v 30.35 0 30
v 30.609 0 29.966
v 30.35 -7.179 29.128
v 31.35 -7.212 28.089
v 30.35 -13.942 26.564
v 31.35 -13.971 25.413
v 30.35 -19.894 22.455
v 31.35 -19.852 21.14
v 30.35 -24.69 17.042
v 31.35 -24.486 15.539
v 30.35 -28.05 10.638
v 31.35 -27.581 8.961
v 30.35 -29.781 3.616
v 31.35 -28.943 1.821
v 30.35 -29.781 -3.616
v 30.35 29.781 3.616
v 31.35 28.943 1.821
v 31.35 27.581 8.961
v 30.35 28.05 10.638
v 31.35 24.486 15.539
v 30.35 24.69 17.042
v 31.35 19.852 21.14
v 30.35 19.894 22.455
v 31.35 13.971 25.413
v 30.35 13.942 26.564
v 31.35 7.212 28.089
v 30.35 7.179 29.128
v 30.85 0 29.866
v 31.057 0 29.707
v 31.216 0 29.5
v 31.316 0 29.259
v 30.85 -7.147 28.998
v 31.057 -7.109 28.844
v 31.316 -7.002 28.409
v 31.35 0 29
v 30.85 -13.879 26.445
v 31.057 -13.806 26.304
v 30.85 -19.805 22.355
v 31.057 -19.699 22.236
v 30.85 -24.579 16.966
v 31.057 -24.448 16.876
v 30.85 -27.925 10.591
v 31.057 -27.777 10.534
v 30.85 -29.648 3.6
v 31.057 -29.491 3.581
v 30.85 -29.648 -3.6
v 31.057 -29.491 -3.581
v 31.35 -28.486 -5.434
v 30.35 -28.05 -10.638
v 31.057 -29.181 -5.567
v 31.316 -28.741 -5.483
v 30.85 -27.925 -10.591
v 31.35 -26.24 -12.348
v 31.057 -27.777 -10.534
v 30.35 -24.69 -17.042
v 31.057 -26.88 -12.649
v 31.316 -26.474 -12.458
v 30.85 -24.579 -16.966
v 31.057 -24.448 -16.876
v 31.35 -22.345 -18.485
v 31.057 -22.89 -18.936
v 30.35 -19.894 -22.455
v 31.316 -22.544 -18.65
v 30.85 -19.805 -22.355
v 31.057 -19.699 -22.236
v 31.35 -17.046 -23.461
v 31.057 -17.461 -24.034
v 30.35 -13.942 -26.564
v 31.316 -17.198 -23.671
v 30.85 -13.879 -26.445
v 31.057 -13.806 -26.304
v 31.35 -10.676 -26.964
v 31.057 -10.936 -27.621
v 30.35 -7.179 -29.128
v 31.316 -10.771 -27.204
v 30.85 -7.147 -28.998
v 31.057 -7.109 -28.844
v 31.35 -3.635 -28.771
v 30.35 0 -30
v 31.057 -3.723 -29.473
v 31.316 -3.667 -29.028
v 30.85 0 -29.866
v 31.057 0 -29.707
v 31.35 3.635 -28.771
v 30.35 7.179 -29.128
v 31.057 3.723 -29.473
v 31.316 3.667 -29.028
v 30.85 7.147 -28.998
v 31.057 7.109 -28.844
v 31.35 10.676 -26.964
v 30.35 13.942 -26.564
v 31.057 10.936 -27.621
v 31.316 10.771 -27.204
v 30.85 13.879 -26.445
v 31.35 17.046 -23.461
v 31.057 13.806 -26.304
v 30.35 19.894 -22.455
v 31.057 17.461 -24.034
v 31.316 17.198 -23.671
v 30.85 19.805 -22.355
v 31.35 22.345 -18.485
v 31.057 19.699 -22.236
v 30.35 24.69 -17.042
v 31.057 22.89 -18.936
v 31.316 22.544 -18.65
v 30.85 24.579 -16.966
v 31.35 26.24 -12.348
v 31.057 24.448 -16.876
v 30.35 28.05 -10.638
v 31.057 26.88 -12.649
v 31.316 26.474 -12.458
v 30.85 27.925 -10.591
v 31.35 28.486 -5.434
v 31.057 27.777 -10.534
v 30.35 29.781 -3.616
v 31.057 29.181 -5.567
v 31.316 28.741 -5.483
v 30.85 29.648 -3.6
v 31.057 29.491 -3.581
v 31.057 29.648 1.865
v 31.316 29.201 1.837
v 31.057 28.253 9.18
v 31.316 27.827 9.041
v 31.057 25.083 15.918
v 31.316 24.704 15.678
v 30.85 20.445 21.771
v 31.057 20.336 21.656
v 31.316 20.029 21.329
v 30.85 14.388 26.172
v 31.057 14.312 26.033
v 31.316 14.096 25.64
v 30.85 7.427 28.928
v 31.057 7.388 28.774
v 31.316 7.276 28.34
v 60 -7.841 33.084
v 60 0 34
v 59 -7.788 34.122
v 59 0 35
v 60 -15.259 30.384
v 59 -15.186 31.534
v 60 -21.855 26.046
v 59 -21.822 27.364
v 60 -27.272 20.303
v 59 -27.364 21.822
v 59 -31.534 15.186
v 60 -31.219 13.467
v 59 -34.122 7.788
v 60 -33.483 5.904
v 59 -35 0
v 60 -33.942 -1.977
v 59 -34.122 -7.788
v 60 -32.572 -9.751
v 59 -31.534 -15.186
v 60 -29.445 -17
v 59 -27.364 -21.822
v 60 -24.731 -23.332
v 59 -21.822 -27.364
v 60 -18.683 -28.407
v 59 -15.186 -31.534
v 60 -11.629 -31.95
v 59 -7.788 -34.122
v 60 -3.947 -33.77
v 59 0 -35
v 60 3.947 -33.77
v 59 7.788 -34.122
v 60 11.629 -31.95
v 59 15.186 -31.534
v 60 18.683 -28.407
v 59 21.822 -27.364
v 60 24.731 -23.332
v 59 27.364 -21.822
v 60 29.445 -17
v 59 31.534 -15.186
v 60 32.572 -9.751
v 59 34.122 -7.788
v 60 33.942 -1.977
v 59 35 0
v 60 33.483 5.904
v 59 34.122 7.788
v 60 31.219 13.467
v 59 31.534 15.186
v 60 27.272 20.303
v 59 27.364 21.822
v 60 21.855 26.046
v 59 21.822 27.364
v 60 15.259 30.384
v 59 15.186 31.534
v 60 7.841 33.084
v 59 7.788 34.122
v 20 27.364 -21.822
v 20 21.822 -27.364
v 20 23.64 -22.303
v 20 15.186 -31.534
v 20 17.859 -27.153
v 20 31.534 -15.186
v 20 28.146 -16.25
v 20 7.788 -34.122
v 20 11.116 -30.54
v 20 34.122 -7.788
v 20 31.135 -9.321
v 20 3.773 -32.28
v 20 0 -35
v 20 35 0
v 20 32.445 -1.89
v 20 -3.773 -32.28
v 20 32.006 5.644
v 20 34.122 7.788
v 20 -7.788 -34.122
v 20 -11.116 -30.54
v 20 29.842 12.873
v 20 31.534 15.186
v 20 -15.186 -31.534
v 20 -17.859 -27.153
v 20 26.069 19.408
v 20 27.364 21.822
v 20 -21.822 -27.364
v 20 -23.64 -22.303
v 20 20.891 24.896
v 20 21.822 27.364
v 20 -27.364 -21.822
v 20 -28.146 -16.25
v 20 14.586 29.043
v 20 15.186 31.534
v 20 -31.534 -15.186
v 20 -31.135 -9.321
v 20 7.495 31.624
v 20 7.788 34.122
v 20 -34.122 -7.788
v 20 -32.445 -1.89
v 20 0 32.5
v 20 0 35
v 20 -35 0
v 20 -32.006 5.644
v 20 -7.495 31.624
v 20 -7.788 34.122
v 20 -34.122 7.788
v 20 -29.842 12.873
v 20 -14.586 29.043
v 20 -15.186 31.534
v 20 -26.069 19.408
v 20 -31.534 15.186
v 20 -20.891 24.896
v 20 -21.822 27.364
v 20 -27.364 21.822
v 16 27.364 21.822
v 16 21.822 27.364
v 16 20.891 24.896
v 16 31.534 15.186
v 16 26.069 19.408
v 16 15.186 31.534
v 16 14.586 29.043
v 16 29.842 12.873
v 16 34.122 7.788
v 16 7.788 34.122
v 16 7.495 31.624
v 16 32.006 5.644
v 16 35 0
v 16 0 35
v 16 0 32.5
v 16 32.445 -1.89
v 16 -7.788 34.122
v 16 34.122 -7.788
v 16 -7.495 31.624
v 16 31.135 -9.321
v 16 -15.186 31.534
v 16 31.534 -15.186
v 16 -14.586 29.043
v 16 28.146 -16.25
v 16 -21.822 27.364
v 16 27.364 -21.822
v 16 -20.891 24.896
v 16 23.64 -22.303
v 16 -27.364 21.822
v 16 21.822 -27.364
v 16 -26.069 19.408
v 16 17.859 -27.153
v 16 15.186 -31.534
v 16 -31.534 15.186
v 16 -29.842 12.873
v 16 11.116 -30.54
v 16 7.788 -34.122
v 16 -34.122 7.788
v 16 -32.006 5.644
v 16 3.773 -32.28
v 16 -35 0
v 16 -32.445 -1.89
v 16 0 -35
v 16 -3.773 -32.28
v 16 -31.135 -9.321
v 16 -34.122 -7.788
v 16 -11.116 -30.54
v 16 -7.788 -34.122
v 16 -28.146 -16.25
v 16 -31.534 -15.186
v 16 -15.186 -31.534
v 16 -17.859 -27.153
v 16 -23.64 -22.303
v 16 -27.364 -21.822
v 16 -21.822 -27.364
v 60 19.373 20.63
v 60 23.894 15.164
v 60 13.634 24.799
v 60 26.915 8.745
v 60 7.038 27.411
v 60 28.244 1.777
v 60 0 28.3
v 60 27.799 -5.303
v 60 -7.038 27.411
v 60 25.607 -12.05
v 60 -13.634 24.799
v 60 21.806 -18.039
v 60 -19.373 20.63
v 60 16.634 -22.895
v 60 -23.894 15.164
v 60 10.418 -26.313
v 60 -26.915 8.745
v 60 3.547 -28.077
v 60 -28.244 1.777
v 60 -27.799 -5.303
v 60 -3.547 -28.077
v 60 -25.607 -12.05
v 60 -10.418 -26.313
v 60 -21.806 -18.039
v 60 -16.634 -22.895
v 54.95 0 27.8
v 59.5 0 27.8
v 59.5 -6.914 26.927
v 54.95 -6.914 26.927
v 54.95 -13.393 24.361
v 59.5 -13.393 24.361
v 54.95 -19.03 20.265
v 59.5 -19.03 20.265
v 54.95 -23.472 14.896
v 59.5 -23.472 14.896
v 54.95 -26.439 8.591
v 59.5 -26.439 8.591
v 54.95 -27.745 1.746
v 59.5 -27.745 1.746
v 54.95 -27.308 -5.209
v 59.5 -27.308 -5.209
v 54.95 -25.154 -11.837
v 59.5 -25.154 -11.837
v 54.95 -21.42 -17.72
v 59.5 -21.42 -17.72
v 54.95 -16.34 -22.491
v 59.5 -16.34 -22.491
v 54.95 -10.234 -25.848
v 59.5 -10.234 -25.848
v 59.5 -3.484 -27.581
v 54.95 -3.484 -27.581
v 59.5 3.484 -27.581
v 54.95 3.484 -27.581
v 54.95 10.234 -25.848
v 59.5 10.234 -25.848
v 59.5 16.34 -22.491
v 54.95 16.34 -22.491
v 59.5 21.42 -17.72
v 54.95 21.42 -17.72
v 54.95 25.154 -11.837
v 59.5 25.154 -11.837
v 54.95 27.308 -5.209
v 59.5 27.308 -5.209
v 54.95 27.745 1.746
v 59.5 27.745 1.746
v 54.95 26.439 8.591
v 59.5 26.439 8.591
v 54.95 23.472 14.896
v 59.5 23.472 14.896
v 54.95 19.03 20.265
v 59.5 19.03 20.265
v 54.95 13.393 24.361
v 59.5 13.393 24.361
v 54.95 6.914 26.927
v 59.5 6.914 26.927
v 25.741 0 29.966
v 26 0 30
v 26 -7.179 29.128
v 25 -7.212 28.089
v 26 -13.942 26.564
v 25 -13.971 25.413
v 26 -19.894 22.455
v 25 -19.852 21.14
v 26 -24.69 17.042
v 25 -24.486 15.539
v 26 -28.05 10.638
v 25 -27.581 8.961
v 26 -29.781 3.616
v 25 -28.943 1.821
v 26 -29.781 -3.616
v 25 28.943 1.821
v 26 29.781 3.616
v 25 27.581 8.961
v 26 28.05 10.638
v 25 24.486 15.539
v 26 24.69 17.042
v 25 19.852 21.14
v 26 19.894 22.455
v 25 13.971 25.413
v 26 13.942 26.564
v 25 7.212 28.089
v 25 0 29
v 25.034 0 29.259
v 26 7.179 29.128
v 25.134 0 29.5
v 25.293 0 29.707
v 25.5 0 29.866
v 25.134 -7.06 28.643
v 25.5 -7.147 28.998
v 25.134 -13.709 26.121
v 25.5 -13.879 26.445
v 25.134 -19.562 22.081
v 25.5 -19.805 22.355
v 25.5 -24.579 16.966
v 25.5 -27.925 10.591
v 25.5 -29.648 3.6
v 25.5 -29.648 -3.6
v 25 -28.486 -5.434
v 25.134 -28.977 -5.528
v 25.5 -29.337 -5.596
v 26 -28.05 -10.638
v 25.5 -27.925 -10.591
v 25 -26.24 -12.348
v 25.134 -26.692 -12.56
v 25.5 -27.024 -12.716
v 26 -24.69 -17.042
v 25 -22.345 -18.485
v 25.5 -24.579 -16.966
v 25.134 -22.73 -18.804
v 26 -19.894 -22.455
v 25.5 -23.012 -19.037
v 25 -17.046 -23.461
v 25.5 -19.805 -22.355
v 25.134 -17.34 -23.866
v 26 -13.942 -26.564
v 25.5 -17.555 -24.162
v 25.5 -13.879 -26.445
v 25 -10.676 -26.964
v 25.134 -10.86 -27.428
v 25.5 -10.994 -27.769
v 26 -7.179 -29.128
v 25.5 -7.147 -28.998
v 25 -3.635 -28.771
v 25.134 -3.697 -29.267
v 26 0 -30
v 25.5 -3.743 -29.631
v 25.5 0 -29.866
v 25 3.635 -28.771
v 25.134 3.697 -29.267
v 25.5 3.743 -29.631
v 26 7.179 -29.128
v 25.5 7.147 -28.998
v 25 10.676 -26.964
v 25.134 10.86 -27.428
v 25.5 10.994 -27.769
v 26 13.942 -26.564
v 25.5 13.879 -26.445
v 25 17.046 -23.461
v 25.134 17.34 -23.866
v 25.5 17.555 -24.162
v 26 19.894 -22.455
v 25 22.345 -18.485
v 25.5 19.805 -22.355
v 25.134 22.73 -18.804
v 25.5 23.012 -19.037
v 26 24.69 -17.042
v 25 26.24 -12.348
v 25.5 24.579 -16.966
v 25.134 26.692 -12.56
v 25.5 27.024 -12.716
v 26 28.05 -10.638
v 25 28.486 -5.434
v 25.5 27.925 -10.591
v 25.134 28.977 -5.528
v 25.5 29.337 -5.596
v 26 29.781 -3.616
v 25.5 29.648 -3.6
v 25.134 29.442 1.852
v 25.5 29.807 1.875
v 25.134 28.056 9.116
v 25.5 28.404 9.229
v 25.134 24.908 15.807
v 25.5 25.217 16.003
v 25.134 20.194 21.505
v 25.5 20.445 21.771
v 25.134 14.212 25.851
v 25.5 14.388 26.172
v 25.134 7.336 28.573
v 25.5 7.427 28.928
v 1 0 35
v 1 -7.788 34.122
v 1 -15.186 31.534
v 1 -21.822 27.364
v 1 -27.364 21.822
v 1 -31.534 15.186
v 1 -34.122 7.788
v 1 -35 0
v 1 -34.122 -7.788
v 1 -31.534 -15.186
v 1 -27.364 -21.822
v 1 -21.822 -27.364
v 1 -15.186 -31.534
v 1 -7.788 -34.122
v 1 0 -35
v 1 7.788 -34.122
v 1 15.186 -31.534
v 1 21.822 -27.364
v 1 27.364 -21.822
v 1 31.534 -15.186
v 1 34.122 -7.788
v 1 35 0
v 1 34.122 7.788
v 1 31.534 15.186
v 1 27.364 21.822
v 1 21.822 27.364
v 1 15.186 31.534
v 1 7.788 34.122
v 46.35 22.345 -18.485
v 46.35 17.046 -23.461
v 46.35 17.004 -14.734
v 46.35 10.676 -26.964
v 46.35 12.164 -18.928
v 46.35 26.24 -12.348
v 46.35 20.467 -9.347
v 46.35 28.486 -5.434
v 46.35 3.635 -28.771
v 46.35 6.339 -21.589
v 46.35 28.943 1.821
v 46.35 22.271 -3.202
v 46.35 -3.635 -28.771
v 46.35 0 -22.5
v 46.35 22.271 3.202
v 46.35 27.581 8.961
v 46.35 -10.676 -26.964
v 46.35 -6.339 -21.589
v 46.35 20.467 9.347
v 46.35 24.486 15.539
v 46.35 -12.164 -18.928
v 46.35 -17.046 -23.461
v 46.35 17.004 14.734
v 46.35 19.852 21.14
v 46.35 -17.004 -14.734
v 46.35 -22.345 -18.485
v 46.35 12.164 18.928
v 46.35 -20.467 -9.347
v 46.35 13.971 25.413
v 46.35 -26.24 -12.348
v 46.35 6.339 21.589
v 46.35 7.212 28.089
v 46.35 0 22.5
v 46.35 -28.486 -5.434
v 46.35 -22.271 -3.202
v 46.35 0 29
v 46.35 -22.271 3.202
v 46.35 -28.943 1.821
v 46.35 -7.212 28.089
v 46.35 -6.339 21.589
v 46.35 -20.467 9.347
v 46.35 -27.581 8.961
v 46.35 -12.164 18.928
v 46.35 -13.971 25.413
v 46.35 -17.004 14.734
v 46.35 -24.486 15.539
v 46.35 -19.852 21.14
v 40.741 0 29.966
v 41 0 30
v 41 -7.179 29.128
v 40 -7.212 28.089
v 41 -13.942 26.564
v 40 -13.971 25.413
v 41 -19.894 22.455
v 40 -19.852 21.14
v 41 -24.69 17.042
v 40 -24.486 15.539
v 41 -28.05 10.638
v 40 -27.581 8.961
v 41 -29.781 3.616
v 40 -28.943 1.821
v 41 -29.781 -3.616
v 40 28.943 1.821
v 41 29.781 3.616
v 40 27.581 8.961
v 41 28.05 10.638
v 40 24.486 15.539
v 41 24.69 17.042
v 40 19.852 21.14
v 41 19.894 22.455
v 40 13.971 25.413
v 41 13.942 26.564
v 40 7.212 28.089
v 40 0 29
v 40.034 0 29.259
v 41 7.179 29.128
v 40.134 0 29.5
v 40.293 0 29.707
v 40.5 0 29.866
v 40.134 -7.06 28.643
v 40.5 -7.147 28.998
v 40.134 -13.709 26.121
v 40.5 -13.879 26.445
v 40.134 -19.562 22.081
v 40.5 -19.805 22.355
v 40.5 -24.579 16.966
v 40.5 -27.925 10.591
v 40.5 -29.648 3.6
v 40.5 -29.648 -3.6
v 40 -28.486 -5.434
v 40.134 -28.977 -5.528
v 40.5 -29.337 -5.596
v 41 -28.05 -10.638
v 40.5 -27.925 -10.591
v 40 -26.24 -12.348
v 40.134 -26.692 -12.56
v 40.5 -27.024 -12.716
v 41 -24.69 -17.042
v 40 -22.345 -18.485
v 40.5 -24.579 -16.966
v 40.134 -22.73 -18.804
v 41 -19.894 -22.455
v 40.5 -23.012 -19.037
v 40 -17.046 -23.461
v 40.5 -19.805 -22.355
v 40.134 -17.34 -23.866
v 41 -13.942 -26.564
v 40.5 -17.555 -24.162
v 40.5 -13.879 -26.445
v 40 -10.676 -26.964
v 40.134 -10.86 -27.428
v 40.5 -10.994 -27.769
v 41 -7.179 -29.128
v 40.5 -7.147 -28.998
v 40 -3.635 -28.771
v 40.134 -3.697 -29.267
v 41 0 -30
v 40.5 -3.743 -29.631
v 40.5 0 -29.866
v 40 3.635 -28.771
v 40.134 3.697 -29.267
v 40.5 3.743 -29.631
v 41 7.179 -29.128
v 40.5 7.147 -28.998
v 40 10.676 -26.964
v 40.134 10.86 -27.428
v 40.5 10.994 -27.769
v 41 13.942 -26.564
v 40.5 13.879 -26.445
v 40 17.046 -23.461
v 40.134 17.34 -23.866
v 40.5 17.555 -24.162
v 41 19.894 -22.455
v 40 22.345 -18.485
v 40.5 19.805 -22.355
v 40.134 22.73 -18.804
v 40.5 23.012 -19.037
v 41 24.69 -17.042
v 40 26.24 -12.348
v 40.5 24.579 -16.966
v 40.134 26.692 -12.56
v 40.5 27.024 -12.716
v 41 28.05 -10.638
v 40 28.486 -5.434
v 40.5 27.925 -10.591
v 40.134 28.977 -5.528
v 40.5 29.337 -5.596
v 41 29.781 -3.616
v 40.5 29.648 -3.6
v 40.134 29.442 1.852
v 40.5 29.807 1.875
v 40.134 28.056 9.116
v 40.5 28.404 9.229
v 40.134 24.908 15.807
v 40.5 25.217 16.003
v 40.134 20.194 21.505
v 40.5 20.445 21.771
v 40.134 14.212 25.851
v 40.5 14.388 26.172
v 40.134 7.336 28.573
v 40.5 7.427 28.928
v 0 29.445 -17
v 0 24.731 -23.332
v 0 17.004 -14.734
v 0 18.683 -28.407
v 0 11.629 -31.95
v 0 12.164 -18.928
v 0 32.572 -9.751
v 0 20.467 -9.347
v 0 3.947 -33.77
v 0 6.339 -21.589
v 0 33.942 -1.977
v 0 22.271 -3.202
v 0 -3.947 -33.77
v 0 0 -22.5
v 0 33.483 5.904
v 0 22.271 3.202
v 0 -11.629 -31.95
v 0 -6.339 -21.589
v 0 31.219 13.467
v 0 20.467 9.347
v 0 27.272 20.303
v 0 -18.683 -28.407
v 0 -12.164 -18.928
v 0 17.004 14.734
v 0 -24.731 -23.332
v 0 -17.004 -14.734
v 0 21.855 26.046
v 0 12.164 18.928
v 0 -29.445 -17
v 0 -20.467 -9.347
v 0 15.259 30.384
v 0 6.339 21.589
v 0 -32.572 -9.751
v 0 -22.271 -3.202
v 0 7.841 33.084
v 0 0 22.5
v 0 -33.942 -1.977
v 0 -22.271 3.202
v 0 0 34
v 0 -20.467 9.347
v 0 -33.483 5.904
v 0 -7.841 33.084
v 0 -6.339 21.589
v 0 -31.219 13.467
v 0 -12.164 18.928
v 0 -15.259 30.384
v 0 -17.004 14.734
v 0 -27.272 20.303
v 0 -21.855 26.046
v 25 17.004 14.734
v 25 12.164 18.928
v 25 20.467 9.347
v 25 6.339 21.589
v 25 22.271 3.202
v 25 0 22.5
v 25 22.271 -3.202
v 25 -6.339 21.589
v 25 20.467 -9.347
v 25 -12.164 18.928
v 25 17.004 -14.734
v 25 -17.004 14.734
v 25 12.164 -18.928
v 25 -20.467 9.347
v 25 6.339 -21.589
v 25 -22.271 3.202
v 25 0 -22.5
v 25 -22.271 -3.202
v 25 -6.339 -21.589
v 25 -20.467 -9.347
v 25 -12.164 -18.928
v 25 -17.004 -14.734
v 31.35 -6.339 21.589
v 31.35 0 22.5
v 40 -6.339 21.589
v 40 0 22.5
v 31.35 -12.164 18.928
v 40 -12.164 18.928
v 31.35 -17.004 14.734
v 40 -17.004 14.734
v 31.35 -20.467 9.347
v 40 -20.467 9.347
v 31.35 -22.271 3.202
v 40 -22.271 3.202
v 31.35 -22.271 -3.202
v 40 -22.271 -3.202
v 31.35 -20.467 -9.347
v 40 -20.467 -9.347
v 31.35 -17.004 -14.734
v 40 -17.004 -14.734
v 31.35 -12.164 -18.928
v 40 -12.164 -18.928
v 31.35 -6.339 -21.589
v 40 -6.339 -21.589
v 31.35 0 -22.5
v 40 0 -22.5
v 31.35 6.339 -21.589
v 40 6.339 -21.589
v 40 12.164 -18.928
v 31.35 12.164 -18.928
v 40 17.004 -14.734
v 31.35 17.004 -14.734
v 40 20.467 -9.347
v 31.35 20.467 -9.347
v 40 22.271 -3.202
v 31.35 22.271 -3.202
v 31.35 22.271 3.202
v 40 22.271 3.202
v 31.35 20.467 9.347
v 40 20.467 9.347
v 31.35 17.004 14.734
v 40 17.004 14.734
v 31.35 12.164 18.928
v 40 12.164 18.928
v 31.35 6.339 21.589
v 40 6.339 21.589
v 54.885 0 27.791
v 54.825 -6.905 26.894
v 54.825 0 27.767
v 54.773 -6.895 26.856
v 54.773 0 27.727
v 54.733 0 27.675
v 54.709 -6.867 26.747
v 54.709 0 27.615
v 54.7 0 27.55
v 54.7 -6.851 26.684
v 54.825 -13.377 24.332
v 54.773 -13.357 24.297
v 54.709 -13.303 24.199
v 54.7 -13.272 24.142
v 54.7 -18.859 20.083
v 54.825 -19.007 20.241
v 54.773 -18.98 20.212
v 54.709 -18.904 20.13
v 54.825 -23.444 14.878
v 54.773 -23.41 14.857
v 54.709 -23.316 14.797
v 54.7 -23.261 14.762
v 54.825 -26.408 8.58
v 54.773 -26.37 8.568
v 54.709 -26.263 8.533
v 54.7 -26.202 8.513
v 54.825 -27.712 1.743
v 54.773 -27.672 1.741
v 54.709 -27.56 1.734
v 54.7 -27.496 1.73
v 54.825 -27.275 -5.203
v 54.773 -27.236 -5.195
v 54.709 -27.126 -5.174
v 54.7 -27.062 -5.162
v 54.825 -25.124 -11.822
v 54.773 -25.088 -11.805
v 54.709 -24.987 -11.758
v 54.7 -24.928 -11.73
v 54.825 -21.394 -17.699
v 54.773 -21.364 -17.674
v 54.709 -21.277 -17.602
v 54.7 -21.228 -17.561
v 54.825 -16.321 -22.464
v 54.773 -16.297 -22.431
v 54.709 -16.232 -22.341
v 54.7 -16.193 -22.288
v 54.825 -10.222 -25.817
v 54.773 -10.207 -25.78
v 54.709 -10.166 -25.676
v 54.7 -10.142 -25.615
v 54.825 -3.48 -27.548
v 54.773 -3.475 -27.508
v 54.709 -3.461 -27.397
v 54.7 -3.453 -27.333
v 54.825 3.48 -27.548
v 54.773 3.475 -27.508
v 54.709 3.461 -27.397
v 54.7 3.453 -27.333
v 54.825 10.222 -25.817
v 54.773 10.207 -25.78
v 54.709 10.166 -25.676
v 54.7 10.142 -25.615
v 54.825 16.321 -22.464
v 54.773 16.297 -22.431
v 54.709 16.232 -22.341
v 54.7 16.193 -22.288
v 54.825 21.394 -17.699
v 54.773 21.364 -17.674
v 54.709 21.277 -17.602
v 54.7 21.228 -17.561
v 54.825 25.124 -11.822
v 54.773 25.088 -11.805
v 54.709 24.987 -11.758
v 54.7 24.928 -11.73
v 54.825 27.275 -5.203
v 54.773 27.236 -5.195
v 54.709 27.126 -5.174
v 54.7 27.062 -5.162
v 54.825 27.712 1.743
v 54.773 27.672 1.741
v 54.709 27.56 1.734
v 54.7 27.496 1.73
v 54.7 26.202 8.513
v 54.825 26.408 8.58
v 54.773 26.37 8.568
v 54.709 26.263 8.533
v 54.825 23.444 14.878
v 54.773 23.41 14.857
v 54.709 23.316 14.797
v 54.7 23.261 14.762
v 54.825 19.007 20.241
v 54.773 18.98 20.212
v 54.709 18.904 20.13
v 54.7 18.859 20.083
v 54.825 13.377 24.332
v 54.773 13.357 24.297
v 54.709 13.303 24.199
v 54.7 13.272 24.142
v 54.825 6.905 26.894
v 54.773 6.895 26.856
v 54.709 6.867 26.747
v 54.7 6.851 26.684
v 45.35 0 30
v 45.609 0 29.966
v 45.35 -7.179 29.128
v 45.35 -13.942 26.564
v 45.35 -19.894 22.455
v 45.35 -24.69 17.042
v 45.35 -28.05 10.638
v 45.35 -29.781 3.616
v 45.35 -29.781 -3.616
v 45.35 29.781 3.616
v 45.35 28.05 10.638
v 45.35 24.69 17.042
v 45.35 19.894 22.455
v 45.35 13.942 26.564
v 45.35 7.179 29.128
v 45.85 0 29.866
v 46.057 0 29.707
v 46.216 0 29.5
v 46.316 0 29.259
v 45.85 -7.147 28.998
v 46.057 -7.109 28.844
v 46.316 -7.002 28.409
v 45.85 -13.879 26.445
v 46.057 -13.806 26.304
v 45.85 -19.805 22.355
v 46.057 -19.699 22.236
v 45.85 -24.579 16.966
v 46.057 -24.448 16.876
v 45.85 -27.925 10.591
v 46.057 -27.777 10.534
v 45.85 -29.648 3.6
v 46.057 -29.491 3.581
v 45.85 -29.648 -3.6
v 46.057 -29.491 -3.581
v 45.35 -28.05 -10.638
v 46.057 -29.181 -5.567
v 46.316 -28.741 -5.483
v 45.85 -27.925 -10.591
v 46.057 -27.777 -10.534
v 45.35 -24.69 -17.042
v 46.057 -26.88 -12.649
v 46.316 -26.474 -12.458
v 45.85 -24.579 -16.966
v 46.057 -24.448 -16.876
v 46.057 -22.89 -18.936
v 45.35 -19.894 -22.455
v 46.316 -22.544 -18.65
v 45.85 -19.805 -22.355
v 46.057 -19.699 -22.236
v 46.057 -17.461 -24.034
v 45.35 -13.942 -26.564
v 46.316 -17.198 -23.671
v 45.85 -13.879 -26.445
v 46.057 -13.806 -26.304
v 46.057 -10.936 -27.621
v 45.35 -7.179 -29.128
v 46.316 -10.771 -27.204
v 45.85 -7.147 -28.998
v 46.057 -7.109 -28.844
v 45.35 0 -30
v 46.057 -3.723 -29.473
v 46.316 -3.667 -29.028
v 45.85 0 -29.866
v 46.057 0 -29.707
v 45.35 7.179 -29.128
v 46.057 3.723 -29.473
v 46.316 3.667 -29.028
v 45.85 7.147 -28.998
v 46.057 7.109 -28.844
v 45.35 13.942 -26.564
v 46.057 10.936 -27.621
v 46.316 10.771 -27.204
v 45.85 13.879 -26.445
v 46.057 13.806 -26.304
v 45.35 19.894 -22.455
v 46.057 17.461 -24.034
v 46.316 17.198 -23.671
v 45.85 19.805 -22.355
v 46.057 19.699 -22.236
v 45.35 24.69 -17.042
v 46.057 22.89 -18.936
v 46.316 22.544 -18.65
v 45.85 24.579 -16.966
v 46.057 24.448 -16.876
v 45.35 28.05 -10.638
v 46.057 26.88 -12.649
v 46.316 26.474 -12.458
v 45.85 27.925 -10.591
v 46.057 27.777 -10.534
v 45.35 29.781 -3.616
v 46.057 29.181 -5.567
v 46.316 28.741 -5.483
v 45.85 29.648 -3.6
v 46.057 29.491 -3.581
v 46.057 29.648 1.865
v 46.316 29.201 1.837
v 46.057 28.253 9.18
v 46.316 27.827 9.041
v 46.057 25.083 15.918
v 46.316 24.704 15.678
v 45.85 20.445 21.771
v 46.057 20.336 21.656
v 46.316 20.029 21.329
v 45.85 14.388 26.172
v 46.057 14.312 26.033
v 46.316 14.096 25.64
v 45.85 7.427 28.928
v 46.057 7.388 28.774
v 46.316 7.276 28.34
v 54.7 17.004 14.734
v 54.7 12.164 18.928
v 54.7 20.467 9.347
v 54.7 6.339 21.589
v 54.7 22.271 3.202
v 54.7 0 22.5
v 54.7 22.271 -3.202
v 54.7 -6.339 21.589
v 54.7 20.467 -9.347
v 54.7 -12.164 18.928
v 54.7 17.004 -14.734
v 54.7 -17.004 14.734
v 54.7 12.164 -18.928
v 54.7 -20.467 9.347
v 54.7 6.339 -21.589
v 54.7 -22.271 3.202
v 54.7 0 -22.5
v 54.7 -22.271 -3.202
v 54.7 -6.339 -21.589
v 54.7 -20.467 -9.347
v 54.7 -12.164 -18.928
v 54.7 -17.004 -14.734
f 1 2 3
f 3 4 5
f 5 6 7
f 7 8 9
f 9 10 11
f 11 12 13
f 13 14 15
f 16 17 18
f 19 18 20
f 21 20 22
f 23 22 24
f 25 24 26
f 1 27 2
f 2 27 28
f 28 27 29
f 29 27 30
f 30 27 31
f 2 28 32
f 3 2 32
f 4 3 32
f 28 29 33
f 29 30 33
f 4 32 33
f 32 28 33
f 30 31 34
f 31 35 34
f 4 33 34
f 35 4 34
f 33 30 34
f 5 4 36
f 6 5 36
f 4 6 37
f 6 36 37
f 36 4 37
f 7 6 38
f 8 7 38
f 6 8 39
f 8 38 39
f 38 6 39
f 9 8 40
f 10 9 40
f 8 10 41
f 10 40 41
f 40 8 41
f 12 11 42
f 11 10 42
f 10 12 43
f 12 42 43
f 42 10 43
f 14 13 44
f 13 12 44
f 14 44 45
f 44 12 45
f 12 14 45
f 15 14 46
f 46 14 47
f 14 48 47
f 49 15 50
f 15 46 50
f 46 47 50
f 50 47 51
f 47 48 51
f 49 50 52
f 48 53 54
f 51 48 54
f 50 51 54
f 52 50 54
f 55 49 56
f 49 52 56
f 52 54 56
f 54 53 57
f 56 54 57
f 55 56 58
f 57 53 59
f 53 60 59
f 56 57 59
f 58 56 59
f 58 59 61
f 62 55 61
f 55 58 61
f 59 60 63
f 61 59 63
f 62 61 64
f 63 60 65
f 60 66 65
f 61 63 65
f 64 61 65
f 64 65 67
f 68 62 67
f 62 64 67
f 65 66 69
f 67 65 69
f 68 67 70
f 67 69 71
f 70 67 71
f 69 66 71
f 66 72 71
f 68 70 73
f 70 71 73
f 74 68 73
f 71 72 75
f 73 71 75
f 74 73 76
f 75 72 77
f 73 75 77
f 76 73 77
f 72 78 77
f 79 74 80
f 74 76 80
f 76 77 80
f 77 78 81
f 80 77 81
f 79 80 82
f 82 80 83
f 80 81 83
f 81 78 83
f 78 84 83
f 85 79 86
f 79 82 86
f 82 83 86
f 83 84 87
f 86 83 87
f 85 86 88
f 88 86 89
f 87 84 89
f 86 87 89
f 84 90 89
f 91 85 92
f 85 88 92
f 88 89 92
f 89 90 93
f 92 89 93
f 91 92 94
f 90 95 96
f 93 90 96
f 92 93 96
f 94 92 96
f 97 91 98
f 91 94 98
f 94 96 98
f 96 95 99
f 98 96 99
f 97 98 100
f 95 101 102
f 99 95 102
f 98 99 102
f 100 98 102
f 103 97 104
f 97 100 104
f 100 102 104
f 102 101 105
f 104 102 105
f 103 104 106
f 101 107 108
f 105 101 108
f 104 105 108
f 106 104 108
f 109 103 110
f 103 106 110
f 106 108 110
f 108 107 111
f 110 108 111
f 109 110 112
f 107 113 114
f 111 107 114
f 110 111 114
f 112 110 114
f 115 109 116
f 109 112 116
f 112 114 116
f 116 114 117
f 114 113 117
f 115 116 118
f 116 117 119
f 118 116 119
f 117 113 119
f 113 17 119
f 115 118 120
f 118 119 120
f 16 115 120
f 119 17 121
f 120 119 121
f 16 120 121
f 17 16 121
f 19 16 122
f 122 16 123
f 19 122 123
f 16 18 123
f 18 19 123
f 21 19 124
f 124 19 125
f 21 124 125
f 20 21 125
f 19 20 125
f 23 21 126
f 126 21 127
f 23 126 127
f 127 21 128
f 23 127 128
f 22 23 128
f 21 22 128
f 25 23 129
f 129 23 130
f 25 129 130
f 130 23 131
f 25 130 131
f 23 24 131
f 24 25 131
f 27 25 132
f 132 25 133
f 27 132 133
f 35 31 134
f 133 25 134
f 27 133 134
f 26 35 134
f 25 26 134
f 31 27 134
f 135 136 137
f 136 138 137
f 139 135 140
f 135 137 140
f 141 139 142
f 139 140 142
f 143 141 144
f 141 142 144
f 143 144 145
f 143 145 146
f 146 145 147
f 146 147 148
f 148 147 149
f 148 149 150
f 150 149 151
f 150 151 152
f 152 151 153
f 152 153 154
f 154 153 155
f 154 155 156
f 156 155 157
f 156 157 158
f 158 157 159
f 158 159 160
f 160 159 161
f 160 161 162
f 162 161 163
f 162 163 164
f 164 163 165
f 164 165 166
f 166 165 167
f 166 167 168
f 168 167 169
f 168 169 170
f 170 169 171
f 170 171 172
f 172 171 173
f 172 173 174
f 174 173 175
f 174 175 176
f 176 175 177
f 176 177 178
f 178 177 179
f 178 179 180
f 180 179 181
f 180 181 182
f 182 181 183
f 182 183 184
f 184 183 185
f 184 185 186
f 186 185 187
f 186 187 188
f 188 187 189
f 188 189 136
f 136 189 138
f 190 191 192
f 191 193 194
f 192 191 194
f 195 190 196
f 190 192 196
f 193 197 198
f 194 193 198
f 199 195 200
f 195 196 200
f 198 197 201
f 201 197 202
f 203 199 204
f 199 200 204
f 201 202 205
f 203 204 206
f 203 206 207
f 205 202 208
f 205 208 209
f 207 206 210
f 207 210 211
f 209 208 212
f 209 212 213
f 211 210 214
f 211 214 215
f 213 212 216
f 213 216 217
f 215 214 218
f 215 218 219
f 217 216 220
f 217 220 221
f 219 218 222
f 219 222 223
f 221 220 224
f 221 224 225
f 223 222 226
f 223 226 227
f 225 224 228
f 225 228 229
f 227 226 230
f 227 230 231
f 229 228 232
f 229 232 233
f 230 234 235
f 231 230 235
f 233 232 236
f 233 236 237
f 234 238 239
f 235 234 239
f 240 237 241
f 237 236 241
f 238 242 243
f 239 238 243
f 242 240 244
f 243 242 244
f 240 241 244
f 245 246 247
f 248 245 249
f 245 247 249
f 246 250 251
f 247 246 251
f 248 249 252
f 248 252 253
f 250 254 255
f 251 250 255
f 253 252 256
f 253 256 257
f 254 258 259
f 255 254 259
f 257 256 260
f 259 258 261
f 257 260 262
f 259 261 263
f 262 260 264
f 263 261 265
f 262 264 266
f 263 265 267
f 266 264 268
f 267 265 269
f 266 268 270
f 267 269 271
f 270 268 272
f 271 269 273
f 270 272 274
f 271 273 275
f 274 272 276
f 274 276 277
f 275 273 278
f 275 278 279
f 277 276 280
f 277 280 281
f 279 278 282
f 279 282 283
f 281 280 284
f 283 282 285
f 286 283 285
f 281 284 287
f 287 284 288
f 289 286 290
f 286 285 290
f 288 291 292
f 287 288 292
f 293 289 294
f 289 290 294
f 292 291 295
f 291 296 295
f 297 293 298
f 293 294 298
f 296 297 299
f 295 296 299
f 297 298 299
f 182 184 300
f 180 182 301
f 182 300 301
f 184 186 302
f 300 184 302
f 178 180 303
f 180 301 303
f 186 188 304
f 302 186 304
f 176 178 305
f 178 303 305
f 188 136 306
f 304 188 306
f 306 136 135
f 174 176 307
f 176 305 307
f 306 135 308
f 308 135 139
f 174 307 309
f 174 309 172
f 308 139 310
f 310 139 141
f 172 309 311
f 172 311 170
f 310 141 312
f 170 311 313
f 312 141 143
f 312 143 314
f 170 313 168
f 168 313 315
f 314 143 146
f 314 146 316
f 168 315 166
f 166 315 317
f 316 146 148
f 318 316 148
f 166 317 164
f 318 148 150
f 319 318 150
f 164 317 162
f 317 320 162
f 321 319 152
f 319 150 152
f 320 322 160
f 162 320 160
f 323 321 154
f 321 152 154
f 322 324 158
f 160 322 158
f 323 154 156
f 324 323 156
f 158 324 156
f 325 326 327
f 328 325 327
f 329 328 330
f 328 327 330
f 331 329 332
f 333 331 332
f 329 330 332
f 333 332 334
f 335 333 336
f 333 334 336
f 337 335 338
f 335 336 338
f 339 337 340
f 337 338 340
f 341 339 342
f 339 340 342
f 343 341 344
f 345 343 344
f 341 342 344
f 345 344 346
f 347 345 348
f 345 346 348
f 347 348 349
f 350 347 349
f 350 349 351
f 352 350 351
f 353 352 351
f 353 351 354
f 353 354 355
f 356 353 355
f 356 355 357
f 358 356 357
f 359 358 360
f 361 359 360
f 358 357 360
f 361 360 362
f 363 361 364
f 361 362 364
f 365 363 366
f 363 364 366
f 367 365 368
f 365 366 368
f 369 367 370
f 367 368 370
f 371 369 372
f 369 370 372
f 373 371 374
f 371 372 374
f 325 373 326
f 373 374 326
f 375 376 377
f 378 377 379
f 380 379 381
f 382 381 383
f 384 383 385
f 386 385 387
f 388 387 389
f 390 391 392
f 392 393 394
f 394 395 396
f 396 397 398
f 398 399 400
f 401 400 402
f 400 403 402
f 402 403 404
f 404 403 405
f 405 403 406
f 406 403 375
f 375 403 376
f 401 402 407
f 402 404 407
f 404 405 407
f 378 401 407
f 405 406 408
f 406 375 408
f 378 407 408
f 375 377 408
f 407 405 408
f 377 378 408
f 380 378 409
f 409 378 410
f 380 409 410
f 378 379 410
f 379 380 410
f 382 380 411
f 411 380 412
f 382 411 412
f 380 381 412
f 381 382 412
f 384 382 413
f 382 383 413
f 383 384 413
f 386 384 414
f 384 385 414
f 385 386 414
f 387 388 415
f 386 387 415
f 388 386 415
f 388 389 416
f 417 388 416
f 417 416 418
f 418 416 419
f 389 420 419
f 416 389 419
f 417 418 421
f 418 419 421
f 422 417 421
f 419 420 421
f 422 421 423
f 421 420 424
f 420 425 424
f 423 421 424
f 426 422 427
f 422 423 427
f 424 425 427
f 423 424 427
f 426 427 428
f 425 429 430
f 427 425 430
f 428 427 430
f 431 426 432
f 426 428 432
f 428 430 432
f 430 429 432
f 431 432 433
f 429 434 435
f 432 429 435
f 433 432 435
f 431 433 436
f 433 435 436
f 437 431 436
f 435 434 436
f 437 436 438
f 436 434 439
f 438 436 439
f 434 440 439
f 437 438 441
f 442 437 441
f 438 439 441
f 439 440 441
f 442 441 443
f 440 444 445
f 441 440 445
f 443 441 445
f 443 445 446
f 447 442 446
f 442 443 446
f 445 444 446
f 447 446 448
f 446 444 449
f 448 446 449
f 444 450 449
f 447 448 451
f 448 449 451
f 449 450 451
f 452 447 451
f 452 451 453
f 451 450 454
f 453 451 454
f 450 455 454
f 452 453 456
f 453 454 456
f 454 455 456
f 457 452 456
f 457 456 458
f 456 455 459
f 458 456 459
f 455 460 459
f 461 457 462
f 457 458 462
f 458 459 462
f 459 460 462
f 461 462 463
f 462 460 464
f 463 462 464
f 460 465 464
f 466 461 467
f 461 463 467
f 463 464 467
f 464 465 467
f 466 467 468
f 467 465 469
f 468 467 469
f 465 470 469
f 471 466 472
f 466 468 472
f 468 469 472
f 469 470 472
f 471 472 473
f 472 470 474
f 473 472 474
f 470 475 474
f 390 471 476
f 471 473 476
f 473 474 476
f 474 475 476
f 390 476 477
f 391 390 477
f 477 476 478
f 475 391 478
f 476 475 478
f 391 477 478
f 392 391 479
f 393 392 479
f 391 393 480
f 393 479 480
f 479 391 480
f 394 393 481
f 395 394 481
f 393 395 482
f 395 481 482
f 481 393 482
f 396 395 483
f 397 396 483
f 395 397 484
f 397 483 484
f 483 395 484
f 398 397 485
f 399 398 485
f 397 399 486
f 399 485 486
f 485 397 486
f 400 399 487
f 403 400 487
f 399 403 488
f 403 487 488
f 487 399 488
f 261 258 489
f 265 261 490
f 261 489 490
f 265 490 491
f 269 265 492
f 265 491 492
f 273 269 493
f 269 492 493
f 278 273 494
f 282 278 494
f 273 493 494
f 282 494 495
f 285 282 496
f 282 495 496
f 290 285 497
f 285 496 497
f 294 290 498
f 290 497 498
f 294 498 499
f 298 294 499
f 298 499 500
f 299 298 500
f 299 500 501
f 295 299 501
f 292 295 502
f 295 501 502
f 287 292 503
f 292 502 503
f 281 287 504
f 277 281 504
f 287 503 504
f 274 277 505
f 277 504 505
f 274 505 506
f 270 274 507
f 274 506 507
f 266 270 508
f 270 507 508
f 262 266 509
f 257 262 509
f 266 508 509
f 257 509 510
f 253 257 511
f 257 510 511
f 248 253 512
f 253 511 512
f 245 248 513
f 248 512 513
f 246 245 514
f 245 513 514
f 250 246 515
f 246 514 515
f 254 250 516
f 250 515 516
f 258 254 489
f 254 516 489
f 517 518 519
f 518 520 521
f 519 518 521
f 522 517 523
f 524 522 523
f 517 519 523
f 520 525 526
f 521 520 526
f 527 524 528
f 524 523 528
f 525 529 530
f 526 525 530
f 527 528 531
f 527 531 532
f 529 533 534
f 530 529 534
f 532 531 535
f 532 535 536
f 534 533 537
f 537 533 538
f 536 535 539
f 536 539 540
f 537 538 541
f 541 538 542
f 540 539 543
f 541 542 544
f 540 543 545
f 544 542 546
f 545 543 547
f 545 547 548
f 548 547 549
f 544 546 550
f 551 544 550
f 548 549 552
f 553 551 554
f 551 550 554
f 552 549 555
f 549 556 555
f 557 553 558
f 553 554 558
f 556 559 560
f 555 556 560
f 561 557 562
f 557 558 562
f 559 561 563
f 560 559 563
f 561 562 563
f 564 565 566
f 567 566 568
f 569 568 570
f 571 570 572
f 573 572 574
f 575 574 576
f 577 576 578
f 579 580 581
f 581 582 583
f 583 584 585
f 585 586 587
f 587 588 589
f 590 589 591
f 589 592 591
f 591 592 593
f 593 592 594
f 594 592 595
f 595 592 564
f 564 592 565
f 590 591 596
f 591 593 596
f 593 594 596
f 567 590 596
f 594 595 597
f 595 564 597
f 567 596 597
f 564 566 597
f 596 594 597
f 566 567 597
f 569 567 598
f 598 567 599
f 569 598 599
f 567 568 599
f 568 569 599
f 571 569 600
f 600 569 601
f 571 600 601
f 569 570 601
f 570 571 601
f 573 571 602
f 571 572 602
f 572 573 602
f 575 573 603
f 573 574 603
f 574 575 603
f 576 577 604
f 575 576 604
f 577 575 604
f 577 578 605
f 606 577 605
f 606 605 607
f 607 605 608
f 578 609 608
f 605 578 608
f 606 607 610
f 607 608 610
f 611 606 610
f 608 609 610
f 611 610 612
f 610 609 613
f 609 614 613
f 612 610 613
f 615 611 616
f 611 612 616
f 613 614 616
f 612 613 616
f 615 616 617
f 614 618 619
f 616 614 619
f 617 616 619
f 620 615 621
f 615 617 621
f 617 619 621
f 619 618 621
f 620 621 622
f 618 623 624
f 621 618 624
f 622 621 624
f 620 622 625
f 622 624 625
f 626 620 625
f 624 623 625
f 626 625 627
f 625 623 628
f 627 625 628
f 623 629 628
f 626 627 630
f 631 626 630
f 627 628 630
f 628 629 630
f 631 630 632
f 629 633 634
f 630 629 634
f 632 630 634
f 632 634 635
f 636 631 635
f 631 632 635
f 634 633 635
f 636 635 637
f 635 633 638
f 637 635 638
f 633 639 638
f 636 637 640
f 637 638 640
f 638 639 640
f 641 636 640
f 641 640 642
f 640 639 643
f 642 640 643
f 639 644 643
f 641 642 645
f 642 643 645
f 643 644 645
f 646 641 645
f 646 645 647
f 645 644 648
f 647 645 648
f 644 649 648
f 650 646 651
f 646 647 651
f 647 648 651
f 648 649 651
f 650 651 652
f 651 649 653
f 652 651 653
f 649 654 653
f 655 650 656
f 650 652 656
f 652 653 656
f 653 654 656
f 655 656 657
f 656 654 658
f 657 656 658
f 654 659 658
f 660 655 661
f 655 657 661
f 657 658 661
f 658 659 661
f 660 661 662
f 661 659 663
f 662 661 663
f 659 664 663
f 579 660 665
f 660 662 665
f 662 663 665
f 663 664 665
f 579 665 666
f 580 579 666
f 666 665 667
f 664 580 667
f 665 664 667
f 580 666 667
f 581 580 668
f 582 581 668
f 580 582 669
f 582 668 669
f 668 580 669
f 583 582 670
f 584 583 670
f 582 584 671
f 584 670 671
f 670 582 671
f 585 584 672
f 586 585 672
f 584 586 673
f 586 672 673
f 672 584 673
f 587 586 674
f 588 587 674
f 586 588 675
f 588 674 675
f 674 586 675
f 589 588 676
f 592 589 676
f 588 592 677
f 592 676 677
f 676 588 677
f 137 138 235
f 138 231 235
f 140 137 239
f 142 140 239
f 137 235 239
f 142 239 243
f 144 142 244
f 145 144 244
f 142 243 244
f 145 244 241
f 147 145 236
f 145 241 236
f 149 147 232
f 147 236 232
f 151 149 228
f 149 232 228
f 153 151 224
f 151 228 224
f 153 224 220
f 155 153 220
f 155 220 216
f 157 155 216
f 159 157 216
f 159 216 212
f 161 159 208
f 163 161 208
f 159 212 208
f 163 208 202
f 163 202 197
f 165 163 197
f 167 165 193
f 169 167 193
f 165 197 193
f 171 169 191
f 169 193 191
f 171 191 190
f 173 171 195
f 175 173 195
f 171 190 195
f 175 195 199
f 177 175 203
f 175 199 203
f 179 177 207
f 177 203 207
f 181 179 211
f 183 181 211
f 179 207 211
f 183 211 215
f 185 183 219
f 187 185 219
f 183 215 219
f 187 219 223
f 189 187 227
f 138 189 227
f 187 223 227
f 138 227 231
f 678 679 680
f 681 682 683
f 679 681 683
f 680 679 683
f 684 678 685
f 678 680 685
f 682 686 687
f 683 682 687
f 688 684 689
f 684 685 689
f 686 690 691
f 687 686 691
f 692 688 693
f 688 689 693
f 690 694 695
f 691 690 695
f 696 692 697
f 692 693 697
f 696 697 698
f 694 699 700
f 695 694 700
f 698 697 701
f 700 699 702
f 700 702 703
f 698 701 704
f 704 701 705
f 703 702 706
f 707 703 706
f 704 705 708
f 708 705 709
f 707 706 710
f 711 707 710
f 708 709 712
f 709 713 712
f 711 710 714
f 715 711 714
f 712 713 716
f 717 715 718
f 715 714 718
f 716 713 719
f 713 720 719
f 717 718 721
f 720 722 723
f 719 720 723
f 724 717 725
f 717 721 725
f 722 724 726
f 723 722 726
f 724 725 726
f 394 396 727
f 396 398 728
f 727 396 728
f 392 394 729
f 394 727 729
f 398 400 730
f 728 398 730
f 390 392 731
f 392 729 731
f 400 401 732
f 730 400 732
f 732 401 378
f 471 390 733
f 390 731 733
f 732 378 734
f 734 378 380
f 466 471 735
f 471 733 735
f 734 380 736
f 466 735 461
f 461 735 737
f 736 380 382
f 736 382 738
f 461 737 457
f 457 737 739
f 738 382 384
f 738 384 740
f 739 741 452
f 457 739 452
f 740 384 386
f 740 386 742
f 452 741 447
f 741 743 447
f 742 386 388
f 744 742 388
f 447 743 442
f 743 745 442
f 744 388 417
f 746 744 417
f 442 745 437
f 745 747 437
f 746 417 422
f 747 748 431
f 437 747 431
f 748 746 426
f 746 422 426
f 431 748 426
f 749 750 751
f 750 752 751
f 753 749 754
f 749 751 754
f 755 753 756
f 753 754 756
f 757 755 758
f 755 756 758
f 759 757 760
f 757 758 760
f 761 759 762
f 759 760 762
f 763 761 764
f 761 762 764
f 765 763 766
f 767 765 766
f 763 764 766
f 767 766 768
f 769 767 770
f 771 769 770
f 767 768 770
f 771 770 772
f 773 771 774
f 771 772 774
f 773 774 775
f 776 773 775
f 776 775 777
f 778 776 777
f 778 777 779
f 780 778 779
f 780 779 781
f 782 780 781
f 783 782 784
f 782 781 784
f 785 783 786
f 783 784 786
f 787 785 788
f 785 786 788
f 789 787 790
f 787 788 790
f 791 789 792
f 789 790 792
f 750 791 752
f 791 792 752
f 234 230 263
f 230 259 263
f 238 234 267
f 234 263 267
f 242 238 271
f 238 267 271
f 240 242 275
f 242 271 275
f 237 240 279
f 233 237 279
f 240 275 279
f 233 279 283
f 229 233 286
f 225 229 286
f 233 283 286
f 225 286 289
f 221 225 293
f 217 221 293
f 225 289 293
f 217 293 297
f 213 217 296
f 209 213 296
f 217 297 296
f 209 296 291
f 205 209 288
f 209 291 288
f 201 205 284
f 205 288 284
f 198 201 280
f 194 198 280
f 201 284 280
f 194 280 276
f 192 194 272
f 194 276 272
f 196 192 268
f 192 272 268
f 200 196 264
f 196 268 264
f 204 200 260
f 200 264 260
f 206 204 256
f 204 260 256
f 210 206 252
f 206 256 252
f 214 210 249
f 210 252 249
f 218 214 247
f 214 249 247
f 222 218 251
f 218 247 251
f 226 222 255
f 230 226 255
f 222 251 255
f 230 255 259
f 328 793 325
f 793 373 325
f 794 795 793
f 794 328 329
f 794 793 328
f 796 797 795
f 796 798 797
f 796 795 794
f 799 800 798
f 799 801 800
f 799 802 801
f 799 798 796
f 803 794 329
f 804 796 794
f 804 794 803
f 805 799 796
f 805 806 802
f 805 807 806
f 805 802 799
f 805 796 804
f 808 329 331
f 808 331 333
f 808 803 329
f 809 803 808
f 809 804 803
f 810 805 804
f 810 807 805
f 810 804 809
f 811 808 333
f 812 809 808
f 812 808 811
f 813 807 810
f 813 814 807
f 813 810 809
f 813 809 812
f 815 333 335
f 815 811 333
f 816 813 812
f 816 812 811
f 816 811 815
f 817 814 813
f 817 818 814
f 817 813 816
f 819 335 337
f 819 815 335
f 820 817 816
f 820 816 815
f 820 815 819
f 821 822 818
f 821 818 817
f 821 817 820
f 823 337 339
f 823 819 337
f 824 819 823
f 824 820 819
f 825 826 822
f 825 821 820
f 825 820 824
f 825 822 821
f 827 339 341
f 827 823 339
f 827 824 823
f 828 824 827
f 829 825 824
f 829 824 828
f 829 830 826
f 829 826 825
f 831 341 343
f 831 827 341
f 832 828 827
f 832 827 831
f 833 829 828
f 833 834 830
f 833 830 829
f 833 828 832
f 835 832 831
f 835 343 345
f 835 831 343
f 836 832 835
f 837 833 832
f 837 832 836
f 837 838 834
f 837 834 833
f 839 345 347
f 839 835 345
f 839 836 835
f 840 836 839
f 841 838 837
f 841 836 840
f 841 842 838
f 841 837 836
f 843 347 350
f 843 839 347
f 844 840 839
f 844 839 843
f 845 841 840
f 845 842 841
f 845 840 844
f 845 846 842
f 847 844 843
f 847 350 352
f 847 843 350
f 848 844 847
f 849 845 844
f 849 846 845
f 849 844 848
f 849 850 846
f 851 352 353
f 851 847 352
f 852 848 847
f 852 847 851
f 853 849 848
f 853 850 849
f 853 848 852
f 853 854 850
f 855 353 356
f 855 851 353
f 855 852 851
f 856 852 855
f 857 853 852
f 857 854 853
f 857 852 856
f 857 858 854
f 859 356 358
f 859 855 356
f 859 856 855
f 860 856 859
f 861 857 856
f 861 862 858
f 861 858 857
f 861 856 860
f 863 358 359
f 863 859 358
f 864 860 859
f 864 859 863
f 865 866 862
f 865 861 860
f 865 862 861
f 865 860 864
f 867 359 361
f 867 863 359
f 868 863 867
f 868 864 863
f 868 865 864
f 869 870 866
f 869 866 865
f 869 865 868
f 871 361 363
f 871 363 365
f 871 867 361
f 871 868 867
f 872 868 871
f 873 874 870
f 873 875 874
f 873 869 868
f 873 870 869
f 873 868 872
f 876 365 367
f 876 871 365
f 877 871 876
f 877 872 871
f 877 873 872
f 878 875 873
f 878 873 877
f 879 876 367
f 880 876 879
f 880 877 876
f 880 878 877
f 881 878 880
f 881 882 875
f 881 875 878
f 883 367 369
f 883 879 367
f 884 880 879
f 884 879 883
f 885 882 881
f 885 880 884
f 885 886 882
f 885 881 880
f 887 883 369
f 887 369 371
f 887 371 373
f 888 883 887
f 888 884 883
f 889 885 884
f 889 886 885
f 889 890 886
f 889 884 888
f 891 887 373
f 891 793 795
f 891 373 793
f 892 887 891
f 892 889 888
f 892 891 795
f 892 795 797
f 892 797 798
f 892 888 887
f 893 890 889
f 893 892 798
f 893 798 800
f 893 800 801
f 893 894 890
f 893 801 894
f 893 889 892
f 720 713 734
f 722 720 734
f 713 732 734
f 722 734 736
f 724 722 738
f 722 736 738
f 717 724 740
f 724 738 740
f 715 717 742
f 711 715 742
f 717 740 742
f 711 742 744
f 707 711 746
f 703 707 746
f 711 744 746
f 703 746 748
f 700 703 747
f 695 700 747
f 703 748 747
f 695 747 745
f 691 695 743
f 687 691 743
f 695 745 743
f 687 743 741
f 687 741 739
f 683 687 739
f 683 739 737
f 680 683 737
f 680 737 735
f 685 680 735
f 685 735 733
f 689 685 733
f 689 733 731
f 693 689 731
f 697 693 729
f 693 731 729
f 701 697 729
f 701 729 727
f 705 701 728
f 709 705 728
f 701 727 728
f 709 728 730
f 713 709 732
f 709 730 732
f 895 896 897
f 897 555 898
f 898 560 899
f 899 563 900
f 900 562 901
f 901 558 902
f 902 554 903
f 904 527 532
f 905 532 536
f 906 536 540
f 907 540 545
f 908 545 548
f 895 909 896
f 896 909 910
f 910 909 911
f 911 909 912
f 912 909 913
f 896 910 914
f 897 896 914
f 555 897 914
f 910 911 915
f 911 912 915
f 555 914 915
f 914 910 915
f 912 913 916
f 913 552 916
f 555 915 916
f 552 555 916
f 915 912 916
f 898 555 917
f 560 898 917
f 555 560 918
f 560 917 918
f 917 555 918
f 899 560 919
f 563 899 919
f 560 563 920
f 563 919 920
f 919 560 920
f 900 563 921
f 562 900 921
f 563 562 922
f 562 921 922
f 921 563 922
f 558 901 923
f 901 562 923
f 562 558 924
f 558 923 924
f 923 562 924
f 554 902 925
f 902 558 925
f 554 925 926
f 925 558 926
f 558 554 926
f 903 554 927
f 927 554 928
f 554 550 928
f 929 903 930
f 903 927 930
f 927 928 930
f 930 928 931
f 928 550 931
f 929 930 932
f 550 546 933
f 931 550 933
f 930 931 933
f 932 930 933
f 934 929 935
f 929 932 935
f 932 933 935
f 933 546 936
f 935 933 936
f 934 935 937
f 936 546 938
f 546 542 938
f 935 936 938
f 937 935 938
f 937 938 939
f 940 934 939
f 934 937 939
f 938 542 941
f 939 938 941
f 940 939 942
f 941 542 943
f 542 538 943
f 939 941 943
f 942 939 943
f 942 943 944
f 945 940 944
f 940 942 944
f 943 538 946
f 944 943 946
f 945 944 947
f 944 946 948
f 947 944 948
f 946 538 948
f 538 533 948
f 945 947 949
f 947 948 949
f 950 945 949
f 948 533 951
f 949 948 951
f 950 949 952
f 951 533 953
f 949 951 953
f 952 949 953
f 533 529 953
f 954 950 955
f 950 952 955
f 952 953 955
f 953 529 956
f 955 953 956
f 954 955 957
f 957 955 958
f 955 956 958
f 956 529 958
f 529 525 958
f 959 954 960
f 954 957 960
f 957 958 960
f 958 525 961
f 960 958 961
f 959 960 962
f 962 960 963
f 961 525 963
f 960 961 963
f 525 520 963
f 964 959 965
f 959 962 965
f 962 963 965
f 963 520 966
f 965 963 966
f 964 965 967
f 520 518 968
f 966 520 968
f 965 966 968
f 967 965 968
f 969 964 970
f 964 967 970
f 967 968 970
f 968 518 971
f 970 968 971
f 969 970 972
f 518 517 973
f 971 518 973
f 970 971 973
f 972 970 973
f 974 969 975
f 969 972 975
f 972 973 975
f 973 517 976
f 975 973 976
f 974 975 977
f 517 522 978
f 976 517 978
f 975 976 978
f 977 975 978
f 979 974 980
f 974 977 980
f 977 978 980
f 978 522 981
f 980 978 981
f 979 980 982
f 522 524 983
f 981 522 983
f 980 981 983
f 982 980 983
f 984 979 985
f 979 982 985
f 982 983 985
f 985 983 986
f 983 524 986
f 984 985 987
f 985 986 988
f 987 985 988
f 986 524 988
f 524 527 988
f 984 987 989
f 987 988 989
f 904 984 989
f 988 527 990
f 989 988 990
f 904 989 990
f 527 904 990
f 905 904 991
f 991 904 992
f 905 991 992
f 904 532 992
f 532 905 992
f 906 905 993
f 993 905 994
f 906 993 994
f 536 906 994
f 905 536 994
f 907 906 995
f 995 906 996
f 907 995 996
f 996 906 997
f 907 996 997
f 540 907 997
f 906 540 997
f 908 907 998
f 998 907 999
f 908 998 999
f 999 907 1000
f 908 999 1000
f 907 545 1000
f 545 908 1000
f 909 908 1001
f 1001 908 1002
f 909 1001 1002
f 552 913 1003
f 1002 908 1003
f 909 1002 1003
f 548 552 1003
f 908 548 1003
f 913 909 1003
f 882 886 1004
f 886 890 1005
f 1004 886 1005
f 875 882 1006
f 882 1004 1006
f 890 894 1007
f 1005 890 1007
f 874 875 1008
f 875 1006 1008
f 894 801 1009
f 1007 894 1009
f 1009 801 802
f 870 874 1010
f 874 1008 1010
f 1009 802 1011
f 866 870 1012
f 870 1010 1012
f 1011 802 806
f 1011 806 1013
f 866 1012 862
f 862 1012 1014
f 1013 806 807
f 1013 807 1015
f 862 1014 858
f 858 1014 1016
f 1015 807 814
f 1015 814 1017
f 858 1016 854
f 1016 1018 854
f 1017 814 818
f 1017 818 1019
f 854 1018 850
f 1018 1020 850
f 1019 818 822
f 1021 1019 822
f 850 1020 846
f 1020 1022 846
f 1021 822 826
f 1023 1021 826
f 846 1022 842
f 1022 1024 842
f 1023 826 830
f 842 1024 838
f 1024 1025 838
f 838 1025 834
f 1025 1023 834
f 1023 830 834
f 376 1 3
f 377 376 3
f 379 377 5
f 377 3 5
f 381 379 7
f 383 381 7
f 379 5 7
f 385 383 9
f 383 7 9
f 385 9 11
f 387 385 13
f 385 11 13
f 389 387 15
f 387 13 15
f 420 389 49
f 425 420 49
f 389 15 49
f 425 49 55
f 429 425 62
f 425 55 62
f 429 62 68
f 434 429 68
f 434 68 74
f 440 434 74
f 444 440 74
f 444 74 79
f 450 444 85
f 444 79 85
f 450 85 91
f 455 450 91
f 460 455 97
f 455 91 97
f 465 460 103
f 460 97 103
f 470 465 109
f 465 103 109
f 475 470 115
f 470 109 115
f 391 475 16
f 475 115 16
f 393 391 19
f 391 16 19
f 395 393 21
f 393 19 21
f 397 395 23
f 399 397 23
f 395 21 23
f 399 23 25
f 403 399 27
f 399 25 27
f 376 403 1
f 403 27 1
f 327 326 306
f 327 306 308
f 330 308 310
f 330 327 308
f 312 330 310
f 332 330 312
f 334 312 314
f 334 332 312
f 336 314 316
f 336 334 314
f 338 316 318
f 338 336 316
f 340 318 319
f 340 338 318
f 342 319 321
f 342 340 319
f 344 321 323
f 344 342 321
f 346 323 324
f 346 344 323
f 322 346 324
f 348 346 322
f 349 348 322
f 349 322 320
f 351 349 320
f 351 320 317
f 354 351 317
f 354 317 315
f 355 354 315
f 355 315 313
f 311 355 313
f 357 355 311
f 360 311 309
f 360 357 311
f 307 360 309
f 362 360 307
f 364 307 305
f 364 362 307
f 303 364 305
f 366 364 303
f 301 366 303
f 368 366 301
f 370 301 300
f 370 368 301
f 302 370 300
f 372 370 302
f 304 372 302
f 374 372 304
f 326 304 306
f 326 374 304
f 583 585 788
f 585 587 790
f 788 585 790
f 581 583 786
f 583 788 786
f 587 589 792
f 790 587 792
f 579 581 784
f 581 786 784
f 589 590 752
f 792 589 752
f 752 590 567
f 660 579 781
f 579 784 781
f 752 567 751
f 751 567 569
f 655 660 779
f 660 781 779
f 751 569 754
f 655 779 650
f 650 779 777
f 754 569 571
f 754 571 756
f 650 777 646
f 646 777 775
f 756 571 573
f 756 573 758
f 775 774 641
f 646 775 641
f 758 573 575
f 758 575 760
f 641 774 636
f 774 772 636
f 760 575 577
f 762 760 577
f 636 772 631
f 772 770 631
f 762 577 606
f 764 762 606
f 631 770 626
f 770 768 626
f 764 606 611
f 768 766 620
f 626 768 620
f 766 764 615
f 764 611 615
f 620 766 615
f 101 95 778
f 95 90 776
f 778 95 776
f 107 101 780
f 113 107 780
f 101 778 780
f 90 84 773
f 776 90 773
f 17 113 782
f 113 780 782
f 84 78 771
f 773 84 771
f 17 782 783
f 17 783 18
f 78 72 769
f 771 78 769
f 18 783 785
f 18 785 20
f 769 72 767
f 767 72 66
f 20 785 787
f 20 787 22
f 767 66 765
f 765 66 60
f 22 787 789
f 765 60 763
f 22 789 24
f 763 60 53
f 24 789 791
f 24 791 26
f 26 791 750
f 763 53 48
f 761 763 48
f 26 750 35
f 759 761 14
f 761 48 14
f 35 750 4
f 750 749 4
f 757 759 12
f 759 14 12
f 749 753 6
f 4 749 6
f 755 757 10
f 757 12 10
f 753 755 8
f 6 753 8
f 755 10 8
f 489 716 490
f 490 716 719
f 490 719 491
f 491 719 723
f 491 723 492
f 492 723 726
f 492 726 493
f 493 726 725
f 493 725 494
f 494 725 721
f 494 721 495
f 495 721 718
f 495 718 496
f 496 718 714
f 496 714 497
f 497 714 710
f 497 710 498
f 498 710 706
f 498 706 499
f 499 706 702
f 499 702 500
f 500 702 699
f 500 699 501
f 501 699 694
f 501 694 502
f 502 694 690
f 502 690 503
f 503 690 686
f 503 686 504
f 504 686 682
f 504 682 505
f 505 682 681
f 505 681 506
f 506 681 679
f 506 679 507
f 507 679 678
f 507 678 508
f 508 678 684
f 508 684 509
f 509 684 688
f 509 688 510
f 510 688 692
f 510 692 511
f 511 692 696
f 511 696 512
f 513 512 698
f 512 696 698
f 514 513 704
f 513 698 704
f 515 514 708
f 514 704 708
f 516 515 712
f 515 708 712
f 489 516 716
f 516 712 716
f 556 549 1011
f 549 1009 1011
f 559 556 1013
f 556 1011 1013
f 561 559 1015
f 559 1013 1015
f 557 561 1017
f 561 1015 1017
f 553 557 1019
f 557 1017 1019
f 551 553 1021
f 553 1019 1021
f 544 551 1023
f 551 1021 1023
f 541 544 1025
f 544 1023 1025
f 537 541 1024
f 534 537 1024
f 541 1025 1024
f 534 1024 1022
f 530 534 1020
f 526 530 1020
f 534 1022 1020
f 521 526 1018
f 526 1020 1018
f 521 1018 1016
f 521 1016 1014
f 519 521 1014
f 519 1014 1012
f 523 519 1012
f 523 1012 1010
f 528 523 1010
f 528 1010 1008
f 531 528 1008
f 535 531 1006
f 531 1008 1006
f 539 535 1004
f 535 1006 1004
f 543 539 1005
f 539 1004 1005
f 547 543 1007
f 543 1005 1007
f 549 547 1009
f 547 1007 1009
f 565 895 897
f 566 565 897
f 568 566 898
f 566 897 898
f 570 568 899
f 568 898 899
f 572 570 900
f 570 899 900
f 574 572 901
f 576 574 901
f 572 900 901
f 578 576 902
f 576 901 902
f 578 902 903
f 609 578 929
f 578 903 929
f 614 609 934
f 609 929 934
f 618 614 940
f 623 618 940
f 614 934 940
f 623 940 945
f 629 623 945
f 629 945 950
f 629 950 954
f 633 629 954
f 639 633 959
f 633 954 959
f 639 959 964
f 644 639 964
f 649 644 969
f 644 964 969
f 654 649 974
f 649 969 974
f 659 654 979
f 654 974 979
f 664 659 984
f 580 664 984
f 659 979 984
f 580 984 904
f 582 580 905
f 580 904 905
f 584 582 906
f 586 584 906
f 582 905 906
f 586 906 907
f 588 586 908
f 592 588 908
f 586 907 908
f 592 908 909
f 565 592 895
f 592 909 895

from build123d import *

# Parameters (mm, degrees)
FILLET1_R     = 1
CHAMFER1_SIZE = 0.5
FILLET2_R     = 0.25


with BuildPart() as part:
    # Sketch1 → Revolve1 (revolve)
    with BuildSketch(Plane(origin=(0, 0, 0), x_dir=(1, 0, 0), z_dir=(0, 1, 0)), mode=Mode.PRIVATE) as revolve1_sk:
        Polygon((0, 22.5), (25, 22.5), (25, 30), (31.35, 30), (31.35, 22.5), (40, 22.5), (40, 30), (46.35, 30), (46.35, 22.5), (54.7, 22.5), (54.7, 27.8), (60, 27.8), (60, 34), (59, 35), (20, 35), (20, 32.5), (16, 32.5), (16, 35), (1, 35), (0, 34), align=None)
    revolve(revolve1_sk.sketch.rotate(Axis((-2.239793833, 0, 0), (1, 0, 0)), 180), axis=Axis((-2.239793833, 0, 0), (1, 0, 0)))

    # Fillet1
    fillet1_edges = [part.edges().sort_by_distance(p)[0] for p in [
        (46.35, 0, -30),
        (40, 0, -30),
        (31.35, 0, -30),
        (25, 0, -30),
    ]]
    fillet(fillet1_edges, radius=FILLET1_R)

    # Chamfer1
    chamfer1_edges = [part.edges().sort_by_distance(p)[0] for p in [
        (60, 0, -27.8),
    ]]
    chamfer(chamfer1_edges, length=CHAMFER1_SIZE)

    # Fillet2
    fillet2_edges = [part.edges().sort_by_distance(p)[0] for p in [
        (54.7, 0, -27.8),
    ]]
    fillet(fillet2_edges, radius=FILLET2_R)


solid = part.part
